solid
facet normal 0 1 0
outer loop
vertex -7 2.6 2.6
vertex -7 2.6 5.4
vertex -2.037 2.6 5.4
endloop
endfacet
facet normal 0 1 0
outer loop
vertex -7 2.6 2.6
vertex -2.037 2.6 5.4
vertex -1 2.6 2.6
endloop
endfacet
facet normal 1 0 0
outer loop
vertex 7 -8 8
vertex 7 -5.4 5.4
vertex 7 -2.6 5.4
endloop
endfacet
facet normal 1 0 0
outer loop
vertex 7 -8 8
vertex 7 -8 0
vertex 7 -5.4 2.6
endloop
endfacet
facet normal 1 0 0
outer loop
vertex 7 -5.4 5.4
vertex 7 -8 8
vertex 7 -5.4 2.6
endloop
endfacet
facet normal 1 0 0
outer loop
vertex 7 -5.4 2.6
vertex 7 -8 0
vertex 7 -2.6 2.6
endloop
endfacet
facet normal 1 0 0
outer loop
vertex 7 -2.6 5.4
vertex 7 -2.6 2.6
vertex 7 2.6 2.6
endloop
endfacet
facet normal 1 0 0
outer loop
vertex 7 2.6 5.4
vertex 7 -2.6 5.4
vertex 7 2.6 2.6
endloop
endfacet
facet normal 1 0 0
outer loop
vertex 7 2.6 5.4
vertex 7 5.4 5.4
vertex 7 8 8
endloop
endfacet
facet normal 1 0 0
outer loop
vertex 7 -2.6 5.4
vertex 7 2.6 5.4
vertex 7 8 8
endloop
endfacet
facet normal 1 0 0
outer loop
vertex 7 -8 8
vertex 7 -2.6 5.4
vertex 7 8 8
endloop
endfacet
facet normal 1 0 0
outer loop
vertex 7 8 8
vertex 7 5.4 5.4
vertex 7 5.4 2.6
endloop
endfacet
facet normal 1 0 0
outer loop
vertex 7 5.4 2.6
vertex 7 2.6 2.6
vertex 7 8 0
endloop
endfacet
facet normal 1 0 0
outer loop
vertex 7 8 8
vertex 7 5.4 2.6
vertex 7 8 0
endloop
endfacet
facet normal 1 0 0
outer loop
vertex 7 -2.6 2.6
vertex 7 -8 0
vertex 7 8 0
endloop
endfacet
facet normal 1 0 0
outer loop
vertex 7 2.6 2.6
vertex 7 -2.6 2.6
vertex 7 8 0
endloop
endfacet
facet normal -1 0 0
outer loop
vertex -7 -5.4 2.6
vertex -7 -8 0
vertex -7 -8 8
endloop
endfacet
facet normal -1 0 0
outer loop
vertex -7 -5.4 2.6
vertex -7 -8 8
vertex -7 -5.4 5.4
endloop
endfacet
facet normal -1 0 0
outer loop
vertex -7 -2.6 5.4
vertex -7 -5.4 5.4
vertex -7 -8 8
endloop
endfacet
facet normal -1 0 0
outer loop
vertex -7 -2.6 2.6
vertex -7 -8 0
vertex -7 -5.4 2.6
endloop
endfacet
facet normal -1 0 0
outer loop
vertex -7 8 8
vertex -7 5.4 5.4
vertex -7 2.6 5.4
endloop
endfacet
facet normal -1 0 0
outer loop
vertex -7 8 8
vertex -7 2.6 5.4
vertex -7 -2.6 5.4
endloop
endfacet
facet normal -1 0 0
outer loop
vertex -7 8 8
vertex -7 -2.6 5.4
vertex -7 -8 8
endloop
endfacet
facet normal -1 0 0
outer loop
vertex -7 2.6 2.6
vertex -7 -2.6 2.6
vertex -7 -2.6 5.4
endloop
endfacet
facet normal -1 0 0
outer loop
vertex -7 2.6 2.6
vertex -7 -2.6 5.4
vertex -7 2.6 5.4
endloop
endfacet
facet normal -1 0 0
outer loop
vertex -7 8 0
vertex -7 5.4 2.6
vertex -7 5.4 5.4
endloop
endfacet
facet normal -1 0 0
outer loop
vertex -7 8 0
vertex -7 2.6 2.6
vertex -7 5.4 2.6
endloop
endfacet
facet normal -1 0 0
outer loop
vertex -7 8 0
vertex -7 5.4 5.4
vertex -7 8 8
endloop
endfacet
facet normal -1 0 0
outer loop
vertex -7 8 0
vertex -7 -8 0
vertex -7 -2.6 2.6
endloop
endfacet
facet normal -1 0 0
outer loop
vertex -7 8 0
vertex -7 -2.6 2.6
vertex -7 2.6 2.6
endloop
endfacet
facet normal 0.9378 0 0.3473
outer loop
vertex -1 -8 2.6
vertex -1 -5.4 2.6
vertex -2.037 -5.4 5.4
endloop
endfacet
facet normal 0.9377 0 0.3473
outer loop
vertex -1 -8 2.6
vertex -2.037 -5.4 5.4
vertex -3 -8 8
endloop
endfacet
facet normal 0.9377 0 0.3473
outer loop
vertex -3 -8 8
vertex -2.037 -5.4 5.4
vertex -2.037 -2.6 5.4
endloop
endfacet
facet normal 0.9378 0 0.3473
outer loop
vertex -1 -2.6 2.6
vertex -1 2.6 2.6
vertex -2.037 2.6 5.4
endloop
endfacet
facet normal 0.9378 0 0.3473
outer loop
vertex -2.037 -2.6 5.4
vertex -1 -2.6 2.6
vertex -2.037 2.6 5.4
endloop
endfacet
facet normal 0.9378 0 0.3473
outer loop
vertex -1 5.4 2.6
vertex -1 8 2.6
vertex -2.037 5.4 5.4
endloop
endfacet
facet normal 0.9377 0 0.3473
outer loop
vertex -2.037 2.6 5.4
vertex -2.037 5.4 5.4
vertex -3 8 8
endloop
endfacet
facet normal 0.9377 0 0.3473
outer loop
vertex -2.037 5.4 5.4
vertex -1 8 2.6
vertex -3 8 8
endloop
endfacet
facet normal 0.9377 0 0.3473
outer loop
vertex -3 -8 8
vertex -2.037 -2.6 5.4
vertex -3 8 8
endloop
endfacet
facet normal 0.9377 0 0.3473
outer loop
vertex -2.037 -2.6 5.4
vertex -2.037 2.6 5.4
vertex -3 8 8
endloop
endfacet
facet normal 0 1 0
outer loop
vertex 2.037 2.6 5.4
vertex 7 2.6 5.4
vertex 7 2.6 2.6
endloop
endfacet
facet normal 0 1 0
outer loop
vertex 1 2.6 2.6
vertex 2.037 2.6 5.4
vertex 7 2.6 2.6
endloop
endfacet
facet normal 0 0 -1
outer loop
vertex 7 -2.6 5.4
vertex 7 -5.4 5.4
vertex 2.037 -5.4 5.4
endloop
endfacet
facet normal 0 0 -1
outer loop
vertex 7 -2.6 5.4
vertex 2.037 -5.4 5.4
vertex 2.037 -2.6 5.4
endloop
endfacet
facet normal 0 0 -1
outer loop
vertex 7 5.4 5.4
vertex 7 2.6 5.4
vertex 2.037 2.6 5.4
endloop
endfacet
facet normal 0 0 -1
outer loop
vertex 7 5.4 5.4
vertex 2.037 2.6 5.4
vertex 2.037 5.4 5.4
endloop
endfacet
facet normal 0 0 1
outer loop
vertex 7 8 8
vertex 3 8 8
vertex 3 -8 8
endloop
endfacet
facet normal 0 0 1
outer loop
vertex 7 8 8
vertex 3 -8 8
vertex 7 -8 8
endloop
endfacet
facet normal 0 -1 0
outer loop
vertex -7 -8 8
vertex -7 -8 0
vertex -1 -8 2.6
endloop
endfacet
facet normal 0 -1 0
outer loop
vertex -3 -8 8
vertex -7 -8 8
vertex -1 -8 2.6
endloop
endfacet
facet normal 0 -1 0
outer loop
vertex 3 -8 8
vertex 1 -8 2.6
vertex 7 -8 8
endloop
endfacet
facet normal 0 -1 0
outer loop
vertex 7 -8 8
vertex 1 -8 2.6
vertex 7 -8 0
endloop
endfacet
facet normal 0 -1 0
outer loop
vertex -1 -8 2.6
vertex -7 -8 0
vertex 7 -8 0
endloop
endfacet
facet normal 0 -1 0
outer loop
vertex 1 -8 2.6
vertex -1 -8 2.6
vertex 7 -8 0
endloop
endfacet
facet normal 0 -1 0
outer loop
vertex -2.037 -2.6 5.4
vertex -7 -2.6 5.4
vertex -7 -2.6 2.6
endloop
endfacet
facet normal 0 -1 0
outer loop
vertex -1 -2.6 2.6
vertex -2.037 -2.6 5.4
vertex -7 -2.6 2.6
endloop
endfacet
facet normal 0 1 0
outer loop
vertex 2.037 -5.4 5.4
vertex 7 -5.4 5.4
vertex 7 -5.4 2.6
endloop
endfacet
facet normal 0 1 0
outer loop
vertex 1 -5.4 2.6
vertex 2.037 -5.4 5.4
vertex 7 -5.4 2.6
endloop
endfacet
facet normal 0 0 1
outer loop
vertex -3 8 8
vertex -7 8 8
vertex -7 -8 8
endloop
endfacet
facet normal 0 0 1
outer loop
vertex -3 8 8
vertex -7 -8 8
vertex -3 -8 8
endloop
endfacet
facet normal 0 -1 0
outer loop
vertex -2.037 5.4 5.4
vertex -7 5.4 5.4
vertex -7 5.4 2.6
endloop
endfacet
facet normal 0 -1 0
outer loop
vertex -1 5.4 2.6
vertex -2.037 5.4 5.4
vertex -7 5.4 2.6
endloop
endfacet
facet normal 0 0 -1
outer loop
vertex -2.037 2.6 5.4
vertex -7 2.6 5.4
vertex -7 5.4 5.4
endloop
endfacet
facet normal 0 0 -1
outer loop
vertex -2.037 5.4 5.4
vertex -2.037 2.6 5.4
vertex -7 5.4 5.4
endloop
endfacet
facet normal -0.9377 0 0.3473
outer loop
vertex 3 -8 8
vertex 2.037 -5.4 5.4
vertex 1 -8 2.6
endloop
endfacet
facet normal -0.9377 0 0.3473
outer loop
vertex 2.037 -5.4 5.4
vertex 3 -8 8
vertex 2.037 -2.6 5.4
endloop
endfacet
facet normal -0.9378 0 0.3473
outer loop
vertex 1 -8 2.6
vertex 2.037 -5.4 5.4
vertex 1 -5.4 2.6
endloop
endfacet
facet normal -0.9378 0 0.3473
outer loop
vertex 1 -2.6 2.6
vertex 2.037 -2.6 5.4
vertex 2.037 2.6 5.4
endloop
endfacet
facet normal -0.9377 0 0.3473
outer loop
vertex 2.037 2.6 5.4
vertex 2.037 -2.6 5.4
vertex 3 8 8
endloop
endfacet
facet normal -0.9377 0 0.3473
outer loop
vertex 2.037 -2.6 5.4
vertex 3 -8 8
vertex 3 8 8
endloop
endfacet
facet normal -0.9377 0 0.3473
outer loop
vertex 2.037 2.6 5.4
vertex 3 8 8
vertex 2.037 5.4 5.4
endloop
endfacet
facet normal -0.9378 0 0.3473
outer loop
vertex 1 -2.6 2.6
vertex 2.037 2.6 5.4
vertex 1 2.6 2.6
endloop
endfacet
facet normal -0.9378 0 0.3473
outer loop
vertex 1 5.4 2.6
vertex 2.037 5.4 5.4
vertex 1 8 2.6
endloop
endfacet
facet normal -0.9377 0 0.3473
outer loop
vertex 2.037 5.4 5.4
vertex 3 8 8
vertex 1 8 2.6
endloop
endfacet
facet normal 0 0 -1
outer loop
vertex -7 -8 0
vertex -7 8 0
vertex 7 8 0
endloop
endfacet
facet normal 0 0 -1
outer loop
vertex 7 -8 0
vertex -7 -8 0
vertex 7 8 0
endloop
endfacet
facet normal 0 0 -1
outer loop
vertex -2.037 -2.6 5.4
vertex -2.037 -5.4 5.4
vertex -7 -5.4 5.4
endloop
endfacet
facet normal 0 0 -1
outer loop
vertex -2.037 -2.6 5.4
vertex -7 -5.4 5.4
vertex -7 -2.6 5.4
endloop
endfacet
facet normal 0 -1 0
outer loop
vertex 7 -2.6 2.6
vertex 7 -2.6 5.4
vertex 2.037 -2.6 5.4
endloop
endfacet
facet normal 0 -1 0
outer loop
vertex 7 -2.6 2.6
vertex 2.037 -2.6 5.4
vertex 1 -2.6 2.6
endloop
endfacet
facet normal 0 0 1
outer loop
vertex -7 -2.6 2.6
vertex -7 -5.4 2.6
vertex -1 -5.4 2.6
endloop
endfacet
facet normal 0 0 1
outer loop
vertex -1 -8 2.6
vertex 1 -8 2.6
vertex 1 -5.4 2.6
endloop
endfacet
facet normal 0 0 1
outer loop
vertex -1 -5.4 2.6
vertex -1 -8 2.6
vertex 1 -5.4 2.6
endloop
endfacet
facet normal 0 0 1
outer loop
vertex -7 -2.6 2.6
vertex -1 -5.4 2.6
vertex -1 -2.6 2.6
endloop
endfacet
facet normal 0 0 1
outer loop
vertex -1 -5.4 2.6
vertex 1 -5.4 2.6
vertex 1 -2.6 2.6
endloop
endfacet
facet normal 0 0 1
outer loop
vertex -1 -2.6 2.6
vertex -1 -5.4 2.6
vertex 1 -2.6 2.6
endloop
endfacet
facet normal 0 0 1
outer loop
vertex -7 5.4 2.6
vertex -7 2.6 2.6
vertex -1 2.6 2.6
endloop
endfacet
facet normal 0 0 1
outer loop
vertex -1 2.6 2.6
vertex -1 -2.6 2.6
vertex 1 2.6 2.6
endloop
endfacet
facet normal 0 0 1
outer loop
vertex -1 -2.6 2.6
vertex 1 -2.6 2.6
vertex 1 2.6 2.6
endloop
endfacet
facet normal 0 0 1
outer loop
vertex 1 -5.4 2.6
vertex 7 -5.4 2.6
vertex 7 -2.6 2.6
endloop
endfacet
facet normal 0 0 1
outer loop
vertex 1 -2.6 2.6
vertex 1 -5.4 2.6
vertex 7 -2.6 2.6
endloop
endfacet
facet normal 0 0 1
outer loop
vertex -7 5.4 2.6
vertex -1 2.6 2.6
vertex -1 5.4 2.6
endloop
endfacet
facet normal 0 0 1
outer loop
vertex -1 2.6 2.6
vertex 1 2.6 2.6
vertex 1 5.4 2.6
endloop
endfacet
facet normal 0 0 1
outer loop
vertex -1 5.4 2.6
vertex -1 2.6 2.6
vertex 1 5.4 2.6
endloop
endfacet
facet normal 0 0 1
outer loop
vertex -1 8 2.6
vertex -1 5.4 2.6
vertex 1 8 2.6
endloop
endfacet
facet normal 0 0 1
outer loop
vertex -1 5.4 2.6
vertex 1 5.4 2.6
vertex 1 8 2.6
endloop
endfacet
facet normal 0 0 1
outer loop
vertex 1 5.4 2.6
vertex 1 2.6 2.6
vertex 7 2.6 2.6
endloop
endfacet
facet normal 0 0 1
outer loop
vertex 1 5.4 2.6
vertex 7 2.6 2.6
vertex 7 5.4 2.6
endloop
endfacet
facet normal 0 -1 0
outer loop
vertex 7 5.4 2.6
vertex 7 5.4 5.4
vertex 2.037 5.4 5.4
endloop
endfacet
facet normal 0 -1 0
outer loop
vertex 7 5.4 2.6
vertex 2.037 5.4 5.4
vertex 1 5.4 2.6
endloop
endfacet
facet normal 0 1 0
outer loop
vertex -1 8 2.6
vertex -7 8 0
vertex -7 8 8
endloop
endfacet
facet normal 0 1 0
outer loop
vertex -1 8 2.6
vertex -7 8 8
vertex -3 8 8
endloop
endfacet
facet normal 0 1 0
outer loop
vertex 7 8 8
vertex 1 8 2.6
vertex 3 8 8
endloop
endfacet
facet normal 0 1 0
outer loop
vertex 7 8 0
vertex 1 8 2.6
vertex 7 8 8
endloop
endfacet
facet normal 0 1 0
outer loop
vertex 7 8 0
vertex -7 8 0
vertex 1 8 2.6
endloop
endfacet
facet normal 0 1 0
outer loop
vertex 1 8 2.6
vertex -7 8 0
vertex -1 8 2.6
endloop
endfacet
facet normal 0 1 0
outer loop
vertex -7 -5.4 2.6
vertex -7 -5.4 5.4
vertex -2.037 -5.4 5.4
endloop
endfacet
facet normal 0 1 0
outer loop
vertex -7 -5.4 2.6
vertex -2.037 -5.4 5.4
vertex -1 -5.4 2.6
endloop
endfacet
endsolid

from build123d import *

# Parameters (mm, degrees)
ESBO_O1_W                = 14
ESBO_O1_H                = 16
RESSALTO_EXTRUS_O1_DEPTH = 8
ESBO_O3_W                = 2.8
ESBO_O3_H                = 2.8
CORTE_EXTRUS_O2_DEPTH    = 19
CORTE_EXTRUS_O3_DEPTH    = 20.209372712


with BuildPart() as part:
    # Esboço1 → Ressalto-extrusão1 (new body)
    with BuildSketch(Plane.XY):
        Rectangle(ESBO_O1_W, ESBO_O1_H)
    extrude(amount=RESSALTO_EXTRUS_O1_DEPTH)

    # Esboço3 → Corte-extrusão2 (cut, through all)
    with BuildSketch(Plane(origin=(7, 0, 0), x_dir=(0, 0, -1), z_dir=(1, 0, 0))):
        with Locations((-4, 4)):
            Rectangle(ESBO_O3_W, ESBO_O3_H)
        with Locations((-4, -4)):
            Rectangle(ESBO_O3_W, ESBO_O3_H)
    extrude(amount=-CORTE_EXTRUS_O2_DEPTH, mode=Mode.SUBTRACT)

    # Esboço5 → Corte-extrusão3 (cut, through all)
    with BuildSketch(Plane(origin=(0, 8, 0), x_dir=(1, 0, 0), z_dir=(0, 1, 0))):
        Polygon((-1, -2.6), (-3, -8), (3, -8), (1, -2.6), align=None)
    extrude(amount=-CORTE_EXTRUS_O3_DEPTH, mode=Mode.SUBTRACT)


solid = part.part
